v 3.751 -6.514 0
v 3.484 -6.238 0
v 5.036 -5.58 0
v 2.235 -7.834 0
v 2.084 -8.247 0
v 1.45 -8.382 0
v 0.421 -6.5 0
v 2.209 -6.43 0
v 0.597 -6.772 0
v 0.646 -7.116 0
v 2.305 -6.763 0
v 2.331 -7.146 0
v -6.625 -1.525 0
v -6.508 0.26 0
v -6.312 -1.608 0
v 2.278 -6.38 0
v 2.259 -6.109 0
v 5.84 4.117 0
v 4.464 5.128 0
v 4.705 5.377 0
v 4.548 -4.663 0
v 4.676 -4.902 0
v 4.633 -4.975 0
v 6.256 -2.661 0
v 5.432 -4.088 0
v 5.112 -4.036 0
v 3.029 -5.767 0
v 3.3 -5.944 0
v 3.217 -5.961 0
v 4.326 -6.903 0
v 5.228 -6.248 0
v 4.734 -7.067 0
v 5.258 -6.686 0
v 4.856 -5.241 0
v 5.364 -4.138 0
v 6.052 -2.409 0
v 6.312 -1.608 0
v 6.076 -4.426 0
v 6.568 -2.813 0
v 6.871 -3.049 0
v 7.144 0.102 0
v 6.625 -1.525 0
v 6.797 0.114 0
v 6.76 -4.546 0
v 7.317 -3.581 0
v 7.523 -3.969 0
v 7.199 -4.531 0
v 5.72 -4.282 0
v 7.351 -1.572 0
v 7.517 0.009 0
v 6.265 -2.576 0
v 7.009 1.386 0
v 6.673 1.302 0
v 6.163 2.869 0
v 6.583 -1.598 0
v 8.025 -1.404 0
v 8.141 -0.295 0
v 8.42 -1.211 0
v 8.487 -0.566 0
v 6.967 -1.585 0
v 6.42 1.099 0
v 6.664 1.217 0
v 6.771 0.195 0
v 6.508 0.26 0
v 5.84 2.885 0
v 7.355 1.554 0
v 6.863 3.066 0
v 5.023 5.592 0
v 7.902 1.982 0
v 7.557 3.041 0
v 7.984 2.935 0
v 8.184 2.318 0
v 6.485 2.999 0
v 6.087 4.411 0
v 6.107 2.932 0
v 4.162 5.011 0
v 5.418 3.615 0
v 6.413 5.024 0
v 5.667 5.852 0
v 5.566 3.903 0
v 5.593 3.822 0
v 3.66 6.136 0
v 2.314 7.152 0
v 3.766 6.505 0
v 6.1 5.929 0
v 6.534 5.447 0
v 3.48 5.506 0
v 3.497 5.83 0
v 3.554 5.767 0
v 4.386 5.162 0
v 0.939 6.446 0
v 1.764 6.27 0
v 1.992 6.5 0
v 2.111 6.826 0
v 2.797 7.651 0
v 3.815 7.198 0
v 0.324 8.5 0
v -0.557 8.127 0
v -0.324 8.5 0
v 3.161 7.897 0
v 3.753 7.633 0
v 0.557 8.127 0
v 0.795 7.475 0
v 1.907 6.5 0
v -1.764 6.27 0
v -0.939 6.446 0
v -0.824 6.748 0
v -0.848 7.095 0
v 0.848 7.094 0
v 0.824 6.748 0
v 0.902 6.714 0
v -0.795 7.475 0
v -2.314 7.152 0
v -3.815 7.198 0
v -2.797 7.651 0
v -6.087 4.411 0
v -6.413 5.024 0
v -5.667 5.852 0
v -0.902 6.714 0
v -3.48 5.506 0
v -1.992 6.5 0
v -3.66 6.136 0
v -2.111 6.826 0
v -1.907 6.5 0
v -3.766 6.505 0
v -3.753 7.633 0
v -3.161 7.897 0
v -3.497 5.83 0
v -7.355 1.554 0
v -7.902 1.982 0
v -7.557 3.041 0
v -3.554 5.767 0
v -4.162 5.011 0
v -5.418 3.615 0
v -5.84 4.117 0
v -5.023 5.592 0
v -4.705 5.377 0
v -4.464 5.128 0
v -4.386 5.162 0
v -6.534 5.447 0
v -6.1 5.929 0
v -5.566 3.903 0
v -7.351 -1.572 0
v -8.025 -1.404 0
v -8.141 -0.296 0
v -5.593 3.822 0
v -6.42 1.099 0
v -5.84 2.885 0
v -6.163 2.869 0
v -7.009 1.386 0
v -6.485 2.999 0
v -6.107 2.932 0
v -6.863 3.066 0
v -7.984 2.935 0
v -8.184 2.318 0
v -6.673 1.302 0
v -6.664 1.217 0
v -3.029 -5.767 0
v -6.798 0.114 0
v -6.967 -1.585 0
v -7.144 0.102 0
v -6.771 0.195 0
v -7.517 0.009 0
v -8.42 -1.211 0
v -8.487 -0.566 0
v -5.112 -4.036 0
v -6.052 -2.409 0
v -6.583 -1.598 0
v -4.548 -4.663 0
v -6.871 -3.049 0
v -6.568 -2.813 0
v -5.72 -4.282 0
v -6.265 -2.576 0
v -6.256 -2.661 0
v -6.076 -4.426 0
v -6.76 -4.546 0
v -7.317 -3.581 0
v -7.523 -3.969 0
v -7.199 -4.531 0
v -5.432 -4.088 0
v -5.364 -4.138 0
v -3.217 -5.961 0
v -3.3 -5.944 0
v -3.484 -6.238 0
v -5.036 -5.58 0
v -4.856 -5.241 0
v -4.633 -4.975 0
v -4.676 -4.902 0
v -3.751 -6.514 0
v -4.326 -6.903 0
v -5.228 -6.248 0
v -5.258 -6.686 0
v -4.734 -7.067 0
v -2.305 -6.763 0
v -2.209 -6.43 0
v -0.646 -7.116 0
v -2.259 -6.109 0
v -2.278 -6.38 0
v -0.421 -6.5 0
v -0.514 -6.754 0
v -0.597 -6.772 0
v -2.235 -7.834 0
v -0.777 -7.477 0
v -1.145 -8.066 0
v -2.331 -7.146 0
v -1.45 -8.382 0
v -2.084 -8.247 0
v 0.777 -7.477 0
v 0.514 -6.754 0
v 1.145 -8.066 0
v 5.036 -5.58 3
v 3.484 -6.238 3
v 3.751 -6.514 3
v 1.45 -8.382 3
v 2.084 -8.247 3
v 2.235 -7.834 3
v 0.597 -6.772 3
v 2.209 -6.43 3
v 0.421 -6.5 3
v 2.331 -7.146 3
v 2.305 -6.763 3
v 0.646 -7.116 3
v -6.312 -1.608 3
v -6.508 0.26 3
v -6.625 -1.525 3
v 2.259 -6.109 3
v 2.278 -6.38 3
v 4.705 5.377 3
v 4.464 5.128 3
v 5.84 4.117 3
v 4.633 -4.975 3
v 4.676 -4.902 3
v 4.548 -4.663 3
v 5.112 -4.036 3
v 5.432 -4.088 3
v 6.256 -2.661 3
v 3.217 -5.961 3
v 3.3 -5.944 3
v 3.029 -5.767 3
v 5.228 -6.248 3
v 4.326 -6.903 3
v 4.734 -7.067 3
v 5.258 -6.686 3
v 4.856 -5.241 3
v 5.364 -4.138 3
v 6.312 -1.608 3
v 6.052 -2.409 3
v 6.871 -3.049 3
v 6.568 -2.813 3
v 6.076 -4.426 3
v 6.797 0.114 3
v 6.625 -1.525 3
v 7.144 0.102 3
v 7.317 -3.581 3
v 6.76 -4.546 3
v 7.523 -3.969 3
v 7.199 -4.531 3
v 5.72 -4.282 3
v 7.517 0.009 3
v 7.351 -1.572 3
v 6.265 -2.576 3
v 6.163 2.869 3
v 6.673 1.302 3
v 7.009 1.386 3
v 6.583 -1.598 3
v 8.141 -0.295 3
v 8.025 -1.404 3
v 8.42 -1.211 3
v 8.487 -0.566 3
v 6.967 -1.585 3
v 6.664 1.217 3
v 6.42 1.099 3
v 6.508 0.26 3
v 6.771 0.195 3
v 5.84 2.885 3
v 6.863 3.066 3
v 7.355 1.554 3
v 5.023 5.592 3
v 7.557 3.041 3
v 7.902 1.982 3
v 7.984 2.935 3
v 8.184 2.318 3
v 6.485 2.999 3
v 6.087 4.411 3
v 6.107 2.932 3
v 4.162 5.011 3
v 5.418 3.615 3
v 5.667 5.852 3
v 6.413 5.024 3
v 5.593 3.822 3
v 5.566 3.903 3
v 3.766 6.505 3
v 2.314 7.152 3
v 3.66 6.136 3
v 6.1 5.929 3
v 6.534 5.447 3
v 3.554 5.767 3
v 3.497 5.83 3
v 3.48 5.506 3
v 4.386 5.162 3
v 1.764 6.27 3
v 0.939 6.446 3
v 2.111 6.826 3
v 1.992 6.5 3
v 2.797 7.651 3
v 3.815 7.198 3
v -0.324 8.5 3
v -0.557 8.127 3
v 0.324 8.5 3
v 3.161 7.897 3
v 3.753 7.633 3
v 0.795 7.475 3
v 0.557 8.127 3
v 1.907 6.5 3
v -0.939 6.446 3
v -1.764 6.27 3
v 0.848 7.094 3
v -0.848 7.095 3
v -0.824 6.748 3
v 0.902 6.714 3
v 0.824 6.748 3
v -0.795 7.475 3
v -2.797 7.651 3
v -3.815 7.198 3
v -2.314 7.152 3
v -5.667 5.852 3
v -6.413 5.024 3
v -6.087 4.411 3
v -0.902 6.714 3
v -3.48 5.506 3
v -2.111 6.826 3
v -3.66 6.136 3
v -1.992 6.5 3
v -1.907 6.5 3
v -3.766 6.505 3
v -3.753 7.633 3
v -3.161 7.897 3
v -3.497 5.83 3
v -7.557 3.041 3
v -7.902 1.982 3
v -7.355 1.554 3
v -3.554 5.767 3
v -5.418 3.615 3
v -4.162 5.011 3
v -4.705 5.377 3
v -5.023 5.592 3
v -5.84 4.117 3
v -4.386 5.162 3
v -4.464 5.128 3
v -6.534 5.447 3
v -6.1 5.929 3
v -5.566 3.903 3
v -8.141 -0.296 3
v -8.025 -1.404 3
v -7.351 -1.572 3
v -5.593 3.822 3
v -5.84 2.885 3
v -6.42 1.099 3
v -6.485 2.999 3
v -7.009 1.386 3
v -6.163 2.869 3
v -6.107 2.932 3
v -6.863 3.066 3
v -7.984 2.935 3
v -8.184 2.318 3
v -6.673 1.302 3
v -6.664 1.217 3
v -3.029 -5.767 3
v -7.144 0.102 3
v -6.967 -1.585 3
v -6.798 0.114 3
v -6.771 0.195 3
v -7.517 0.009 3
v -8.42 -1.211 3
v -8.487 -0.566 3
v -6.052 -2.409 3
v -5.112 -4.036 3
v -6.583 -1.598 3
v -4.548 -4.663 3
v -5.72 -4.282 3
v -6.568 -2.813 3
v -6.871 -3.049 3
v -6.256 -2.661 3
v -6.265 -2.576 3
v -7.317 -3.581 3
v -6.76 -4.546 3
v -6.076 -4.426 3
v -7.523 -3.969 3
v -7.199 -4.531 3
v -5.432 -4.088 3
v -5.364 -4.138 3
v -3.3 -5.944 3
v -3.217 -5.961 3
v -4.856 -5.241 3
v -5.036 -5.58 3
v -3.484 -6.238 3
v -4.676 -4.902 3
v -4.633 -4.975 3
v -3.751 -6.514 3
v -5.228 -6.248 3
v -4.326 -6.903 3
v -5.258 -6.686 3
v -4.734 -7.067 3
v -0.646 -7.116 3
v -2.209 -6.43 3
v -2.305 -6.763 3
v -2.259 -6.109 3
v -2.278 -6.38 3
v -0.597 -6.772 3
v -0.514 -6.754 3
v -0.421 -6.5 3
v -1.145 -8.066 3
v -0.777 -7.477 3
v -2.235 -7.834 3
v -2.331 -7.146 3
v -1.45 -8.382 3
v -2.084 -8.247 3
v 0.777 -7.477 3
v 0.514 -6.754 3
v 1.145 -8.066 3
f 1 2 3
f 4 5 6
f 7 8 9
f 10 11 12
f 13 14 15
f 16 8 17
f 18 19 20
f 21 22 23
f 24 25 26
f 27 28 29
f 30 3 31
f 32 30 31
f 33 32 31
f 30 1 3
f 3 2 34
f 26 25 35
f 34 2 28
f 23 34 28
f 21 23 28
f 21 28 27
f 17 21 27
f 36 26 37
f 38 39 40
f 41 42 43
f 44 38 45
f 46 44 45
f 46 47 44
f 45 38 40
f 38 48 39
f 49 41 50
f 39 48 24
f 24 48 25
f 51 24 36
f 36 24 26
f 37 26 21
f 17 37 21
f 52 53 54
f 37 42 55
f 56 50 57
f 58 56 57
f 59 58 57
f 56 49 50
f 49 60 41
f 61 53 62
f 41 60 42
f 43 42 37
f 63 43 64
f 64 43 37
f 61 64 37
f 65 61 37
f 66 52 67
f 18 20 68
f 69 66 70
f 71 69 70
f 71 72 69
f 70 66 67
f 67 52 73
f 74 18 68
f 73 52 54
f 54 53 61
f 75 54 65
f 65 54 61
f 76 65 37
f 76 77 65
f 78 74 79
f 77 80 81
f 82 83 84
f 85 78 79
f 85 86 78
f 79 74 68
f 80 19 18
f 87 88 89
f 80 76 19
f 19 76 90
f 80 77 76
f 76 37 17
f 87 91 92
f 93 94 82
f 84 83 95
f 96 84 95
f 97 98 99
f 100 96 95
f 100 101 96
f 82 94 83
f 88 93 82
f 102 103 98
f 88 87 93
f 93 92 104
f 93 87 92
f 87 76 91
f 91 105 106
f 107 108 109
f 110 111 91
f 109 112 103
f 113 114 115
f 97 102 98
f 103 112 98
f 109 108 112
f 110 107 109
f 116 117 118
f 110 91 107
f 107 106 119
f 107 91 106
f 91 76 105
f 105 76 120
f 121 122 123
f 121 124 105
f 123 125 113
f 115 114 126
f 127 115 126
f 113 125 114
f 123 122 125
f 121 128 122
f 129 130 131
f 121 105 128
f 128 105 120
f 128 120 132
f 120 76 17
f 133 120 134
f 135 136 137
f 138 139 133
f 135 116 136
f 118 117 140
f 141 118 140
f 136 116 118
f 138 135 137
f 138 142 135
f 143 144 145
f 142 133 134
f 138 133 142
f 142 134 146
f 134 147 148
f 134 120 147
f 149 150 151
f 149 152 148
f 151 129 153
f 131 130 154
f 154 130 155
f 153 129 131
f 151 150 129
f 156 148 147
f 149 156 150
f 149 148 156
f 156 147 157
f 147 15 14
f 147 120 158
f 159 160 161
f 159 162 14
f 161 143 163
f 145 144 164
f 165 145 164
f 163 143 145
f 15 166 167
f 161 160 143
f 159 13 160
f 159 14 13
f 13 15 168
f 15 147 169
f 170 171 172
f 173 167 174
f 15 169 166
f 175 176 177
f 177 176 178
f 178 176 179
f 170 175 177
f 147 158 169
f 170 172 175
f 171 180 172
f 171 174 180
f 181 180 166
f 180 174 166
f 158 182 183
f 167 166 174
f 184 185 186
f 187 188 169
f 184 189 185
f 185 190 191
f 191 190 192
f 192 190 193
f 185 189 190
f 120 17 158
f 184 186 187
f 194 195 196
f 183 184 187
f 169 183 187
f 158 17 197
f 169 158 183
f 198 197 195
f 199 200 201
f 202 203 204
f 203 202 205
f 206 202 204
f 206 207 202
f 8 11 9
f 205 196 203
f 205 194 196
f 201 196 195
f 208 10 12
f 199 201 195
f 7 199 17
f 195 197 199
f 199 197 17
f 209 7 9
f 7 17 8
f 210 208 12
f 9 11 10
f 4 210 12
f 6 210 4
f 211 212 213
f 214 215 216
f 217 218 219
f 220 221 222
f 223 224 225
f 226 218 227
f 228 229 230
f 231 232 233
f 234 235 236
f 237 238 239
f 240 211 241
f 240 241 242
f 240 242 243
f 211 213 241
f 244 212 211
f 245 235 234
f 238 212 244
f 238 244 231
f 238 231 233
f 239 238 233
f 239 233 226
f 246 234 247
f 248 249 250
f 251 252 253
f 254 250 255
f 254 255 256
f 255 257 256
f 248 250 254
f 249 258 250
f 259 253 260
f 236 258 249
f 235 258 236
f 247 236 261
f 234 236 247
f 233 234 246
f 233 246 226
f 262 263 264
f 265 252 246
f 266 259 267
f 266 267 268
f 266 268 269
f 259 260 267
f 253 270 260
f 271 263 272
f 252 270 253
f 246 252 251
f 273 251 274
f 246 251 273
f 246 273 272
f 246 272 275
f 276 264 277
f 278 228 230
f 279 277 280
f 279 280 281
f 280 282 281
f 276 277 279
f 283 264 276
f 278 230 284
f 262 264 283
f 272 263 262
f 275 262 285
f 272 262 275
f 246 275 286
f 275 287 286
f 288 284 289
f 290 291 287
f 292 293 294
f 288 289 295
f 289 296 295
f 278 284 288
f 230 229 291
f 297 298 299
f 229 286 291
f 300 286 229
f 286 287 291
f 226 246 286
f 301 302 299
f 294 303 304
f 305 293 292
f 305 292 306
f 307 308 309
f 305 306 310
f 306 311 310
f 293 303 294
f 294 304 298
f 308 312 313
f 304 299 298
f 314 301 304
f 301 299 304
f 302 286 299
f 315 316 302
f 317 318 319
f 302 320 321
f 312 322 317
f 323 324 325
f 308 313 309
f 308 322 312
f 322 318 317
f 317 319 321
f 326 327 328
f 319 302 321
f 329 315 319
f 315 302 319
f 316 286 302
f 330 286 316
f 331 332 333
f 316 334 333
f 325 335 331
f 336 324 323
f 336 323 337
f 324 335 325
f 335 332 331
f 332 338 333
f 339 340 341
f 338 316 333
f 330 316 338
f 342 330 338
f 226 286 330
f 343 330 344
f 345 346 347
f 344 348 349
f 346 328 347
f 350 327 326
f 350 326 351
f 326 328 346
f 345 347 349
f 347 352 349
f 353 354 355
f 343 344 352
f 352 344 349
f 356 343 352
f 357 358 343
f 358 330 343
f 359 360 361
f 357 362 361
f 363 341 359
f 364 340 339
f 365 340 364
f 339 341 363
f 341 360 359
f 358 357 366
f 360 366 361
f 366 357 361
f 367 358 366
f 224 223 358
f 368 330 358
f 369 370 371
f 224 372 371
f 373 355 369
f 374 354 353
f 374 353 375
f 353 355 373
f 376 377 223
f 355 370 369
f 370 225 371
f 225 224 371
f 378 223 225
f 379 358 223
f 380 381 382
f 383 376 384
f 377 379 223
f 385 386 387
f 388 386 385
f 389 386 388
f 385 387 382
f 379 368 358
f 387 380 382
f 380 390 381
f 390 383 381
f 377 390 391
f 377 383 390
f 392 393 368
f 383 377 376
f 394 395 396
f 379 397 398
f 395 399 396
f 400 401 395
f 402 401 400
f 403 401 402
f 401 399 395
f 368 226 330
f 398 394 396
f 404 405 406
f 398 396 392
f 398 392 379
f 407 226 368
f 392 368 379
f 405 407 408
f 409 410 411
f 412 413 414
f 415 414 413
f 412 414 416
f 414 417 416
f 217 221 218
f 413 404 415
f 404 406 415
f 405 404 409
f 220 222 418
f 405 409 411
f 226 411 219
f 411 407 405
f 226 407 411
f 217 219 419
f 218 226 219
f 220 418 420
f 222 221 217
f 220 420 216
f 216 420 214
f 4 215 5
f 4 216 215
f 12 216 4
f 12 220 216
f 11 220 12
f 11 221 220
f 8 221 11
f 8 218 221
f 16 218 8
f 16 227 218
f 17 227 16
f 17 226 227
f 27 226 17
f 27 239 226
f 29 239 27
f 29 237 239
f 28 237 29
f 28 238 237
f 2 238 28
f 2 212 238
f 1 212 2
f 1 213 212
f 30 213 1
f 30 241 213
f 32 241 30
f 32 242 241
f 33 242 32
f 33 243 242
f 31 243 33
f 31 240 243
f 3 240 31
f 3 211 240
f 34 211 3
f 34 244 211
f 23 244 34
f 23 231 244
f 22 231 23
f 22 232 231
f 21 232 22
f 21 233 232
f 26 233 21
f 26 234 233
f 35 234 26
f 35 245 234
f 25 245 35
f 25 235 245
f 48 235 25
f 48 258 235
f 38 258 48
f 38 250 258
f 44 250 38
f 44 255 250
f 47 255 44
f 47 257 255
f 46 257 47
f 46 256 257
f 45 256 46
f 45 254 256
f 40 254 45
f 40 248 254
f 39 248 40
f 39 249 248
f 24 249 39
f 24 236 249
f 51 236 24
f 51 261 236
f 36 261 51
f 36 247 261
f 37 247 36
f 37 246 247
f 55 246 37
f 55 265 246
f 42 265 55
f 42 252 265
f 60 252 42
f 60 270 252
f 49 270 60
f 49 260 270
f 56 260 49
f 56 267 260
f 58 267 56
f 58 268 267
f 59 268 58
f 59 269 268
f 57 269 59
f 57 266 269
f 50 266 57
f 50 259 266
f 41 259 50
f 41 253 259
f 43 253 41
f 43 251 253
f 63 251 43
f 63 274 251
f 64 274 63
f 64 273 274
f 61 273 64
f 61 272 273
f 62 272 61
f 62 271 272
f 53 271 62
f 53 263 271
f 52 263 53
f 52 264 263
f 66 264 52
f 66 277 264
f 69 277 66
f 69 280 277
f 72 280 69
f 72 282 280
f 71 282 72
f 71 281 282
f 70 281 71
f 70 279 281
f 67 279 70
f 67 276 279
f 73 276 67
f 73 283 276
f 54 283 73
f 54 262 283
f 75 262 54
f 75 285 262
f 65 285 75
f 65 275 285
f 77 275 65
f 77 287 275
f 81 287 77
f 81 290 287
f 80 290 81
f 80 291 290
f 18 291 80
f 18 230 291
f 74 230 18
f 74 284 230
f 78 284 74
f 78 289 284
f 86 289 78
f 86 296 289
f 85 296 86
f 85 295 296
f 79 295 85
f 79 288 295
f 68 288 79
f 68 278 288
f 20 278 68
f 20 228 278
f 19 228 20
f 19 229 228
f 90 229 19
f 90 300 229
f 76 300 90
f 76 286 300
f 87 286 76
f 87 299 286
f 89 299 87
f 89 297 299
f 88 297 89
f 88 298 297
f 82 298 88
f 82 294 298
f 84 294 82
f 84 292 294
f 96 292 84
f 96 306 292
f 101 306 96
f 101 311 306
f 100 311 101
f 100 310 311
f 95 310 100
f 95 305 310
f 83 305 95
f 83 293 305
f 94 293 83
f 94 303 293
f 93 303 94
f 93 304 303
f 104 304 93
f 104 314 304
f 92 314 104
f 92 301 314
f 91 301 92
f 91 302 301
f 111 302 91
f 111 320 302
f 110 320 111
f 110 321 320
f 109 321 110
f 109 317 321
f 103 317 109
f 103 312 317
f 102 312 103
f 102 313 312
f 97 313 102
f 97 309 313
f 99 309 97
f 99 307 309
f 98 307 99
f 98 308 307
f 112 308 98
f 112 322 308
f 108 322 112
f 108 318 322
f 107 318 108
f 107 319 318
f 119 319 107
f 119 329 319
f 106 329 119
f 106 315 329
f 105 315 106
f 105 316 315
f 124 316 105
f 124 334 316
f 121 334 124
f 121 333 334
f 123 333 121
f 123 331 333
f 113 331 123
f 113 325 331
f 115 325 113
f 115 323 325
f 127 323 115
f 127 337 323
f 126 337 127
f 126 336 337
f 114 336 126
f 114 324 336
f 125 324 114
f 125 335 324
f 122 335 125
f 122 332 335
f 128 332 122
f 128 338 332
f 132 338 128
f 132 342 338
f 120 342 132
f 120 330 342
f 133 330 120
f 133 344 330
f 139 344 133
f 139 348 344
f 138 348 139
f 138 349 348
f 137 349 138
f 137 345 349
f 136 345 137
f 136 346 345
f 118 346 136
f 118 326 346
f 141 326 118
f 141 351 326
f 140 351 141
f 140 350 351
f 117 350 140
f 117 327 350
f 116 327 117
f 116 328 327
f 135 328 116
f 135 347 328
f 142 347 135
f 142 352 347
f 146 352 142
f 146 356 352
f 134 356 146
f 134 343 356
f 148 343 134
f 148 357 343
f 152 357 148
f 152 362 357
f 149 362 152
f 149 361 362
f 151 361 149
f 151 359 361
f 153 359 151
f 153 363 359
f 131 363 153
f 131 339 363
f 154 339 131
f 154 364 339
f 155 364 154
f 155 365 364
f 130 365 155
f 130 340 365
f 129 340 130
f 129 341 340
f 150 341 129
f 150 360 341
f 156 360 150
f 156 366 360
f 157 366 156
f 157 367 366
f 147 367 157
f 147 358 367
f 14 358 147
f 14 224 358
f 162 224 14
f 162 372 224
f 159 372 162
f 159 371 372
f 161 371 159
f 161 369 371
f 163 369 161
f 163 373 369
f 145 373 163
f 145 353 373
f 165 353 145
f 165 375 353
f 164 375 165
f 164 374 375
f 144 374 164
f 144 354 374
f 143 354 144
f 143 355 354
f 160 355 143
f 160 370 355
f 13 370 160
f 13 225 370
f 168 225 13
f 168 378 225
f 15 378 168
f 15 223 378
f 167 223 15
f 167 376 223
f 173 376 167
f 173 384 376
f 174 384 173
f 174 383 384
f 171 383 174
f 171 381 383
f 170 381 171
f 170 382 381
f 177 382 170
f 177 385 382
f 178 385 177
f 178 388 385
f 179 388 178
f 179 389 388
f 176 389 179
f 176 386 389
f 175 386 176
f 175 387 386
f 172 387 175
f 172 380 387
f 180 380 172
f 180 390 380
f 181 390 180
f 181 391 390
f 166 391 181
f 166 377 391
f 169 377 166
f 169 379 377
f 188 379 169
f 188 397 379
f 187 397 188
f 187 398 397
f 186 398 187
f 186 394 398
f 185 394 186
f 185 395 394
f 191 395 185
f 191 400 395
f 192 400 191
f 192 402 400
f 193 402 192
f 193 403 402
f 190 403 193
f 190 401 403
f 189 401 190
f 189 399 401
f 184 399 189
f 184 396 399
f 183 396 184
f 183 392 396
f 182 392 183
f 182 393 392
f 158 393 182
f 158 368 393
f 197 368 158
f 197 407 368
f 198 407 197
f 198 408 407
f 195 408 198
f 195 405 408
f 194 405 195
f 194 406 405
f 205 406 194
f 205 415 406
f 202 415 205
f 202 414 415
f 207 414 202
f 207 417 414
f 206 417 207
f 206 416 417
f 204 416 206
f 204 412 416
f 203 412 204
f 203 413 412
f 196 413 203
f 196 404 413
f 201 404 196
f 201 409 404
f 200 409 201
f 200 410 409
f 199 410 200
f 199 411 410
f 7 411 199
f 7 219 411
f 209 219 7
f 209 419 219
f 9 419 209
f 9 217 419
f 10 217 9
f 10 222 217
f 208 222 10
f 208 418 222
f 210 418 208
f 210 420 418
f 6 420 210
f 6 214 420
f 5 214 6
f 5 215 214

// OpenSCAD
tap_length = 30;
tap_width1 =  9;
tap_width2 = 11;
tap_height = 15;
$fn = 60;
iterations = 30;
module tap() {
    cylinder( d = tap_width1, h = tap_height );
}

//tap();

module Rack(m = 2, z = 10, x = 0, w = 20, clearance = 0)
{
  polygon(rack(m, z, x, w, clearance)); 
}

module gear2D(m = 1, z = 10, x = 0, w = 20, clearance = 0)
{
  	r_wk = m*z/2 + x; 
    U = m*z*PI; 
   	dy = m;  
  	r_fkc = r_wk + 2*dy *(1-clearance/2);  
  s = 360/iterations; 
  difference()
  {
    circle(r_fkc, $fn = 300);  // workpiece
    for(i=[0:s:360])
      rotate([0, 0, -i])
      translate([-i/360 * U, 0, 0])
      Rack(m, z, x, w, clearance);  // Tool
  }
}

linear_extrude(3) gear2D(m = 1, z = 15);


function rack(m = 2, z = 10, x = 0, w = 20, clearance = 0) = 
  let (dx = 2*tan(w)) 
  let (c = clearance/m) 
  let (o = dx/2-PI/4) 
  let (r = z/2 + x + 1) 
  let(X=[c, PI/2-dx-c, PI/2-c, PI-dx+c]) 
  let(Y=[r-c, r-c, r-2-c, r-2-c])
  m*concat([[-PI+o, r+5]], 
           [for(i=[-1:z], j=[0:3]) [o+i*PI+X[j], Y[j]]], 
           [[o+PI*(z+1)+c, r-c], [o+PI*(z+1)+c, r+5]]);
